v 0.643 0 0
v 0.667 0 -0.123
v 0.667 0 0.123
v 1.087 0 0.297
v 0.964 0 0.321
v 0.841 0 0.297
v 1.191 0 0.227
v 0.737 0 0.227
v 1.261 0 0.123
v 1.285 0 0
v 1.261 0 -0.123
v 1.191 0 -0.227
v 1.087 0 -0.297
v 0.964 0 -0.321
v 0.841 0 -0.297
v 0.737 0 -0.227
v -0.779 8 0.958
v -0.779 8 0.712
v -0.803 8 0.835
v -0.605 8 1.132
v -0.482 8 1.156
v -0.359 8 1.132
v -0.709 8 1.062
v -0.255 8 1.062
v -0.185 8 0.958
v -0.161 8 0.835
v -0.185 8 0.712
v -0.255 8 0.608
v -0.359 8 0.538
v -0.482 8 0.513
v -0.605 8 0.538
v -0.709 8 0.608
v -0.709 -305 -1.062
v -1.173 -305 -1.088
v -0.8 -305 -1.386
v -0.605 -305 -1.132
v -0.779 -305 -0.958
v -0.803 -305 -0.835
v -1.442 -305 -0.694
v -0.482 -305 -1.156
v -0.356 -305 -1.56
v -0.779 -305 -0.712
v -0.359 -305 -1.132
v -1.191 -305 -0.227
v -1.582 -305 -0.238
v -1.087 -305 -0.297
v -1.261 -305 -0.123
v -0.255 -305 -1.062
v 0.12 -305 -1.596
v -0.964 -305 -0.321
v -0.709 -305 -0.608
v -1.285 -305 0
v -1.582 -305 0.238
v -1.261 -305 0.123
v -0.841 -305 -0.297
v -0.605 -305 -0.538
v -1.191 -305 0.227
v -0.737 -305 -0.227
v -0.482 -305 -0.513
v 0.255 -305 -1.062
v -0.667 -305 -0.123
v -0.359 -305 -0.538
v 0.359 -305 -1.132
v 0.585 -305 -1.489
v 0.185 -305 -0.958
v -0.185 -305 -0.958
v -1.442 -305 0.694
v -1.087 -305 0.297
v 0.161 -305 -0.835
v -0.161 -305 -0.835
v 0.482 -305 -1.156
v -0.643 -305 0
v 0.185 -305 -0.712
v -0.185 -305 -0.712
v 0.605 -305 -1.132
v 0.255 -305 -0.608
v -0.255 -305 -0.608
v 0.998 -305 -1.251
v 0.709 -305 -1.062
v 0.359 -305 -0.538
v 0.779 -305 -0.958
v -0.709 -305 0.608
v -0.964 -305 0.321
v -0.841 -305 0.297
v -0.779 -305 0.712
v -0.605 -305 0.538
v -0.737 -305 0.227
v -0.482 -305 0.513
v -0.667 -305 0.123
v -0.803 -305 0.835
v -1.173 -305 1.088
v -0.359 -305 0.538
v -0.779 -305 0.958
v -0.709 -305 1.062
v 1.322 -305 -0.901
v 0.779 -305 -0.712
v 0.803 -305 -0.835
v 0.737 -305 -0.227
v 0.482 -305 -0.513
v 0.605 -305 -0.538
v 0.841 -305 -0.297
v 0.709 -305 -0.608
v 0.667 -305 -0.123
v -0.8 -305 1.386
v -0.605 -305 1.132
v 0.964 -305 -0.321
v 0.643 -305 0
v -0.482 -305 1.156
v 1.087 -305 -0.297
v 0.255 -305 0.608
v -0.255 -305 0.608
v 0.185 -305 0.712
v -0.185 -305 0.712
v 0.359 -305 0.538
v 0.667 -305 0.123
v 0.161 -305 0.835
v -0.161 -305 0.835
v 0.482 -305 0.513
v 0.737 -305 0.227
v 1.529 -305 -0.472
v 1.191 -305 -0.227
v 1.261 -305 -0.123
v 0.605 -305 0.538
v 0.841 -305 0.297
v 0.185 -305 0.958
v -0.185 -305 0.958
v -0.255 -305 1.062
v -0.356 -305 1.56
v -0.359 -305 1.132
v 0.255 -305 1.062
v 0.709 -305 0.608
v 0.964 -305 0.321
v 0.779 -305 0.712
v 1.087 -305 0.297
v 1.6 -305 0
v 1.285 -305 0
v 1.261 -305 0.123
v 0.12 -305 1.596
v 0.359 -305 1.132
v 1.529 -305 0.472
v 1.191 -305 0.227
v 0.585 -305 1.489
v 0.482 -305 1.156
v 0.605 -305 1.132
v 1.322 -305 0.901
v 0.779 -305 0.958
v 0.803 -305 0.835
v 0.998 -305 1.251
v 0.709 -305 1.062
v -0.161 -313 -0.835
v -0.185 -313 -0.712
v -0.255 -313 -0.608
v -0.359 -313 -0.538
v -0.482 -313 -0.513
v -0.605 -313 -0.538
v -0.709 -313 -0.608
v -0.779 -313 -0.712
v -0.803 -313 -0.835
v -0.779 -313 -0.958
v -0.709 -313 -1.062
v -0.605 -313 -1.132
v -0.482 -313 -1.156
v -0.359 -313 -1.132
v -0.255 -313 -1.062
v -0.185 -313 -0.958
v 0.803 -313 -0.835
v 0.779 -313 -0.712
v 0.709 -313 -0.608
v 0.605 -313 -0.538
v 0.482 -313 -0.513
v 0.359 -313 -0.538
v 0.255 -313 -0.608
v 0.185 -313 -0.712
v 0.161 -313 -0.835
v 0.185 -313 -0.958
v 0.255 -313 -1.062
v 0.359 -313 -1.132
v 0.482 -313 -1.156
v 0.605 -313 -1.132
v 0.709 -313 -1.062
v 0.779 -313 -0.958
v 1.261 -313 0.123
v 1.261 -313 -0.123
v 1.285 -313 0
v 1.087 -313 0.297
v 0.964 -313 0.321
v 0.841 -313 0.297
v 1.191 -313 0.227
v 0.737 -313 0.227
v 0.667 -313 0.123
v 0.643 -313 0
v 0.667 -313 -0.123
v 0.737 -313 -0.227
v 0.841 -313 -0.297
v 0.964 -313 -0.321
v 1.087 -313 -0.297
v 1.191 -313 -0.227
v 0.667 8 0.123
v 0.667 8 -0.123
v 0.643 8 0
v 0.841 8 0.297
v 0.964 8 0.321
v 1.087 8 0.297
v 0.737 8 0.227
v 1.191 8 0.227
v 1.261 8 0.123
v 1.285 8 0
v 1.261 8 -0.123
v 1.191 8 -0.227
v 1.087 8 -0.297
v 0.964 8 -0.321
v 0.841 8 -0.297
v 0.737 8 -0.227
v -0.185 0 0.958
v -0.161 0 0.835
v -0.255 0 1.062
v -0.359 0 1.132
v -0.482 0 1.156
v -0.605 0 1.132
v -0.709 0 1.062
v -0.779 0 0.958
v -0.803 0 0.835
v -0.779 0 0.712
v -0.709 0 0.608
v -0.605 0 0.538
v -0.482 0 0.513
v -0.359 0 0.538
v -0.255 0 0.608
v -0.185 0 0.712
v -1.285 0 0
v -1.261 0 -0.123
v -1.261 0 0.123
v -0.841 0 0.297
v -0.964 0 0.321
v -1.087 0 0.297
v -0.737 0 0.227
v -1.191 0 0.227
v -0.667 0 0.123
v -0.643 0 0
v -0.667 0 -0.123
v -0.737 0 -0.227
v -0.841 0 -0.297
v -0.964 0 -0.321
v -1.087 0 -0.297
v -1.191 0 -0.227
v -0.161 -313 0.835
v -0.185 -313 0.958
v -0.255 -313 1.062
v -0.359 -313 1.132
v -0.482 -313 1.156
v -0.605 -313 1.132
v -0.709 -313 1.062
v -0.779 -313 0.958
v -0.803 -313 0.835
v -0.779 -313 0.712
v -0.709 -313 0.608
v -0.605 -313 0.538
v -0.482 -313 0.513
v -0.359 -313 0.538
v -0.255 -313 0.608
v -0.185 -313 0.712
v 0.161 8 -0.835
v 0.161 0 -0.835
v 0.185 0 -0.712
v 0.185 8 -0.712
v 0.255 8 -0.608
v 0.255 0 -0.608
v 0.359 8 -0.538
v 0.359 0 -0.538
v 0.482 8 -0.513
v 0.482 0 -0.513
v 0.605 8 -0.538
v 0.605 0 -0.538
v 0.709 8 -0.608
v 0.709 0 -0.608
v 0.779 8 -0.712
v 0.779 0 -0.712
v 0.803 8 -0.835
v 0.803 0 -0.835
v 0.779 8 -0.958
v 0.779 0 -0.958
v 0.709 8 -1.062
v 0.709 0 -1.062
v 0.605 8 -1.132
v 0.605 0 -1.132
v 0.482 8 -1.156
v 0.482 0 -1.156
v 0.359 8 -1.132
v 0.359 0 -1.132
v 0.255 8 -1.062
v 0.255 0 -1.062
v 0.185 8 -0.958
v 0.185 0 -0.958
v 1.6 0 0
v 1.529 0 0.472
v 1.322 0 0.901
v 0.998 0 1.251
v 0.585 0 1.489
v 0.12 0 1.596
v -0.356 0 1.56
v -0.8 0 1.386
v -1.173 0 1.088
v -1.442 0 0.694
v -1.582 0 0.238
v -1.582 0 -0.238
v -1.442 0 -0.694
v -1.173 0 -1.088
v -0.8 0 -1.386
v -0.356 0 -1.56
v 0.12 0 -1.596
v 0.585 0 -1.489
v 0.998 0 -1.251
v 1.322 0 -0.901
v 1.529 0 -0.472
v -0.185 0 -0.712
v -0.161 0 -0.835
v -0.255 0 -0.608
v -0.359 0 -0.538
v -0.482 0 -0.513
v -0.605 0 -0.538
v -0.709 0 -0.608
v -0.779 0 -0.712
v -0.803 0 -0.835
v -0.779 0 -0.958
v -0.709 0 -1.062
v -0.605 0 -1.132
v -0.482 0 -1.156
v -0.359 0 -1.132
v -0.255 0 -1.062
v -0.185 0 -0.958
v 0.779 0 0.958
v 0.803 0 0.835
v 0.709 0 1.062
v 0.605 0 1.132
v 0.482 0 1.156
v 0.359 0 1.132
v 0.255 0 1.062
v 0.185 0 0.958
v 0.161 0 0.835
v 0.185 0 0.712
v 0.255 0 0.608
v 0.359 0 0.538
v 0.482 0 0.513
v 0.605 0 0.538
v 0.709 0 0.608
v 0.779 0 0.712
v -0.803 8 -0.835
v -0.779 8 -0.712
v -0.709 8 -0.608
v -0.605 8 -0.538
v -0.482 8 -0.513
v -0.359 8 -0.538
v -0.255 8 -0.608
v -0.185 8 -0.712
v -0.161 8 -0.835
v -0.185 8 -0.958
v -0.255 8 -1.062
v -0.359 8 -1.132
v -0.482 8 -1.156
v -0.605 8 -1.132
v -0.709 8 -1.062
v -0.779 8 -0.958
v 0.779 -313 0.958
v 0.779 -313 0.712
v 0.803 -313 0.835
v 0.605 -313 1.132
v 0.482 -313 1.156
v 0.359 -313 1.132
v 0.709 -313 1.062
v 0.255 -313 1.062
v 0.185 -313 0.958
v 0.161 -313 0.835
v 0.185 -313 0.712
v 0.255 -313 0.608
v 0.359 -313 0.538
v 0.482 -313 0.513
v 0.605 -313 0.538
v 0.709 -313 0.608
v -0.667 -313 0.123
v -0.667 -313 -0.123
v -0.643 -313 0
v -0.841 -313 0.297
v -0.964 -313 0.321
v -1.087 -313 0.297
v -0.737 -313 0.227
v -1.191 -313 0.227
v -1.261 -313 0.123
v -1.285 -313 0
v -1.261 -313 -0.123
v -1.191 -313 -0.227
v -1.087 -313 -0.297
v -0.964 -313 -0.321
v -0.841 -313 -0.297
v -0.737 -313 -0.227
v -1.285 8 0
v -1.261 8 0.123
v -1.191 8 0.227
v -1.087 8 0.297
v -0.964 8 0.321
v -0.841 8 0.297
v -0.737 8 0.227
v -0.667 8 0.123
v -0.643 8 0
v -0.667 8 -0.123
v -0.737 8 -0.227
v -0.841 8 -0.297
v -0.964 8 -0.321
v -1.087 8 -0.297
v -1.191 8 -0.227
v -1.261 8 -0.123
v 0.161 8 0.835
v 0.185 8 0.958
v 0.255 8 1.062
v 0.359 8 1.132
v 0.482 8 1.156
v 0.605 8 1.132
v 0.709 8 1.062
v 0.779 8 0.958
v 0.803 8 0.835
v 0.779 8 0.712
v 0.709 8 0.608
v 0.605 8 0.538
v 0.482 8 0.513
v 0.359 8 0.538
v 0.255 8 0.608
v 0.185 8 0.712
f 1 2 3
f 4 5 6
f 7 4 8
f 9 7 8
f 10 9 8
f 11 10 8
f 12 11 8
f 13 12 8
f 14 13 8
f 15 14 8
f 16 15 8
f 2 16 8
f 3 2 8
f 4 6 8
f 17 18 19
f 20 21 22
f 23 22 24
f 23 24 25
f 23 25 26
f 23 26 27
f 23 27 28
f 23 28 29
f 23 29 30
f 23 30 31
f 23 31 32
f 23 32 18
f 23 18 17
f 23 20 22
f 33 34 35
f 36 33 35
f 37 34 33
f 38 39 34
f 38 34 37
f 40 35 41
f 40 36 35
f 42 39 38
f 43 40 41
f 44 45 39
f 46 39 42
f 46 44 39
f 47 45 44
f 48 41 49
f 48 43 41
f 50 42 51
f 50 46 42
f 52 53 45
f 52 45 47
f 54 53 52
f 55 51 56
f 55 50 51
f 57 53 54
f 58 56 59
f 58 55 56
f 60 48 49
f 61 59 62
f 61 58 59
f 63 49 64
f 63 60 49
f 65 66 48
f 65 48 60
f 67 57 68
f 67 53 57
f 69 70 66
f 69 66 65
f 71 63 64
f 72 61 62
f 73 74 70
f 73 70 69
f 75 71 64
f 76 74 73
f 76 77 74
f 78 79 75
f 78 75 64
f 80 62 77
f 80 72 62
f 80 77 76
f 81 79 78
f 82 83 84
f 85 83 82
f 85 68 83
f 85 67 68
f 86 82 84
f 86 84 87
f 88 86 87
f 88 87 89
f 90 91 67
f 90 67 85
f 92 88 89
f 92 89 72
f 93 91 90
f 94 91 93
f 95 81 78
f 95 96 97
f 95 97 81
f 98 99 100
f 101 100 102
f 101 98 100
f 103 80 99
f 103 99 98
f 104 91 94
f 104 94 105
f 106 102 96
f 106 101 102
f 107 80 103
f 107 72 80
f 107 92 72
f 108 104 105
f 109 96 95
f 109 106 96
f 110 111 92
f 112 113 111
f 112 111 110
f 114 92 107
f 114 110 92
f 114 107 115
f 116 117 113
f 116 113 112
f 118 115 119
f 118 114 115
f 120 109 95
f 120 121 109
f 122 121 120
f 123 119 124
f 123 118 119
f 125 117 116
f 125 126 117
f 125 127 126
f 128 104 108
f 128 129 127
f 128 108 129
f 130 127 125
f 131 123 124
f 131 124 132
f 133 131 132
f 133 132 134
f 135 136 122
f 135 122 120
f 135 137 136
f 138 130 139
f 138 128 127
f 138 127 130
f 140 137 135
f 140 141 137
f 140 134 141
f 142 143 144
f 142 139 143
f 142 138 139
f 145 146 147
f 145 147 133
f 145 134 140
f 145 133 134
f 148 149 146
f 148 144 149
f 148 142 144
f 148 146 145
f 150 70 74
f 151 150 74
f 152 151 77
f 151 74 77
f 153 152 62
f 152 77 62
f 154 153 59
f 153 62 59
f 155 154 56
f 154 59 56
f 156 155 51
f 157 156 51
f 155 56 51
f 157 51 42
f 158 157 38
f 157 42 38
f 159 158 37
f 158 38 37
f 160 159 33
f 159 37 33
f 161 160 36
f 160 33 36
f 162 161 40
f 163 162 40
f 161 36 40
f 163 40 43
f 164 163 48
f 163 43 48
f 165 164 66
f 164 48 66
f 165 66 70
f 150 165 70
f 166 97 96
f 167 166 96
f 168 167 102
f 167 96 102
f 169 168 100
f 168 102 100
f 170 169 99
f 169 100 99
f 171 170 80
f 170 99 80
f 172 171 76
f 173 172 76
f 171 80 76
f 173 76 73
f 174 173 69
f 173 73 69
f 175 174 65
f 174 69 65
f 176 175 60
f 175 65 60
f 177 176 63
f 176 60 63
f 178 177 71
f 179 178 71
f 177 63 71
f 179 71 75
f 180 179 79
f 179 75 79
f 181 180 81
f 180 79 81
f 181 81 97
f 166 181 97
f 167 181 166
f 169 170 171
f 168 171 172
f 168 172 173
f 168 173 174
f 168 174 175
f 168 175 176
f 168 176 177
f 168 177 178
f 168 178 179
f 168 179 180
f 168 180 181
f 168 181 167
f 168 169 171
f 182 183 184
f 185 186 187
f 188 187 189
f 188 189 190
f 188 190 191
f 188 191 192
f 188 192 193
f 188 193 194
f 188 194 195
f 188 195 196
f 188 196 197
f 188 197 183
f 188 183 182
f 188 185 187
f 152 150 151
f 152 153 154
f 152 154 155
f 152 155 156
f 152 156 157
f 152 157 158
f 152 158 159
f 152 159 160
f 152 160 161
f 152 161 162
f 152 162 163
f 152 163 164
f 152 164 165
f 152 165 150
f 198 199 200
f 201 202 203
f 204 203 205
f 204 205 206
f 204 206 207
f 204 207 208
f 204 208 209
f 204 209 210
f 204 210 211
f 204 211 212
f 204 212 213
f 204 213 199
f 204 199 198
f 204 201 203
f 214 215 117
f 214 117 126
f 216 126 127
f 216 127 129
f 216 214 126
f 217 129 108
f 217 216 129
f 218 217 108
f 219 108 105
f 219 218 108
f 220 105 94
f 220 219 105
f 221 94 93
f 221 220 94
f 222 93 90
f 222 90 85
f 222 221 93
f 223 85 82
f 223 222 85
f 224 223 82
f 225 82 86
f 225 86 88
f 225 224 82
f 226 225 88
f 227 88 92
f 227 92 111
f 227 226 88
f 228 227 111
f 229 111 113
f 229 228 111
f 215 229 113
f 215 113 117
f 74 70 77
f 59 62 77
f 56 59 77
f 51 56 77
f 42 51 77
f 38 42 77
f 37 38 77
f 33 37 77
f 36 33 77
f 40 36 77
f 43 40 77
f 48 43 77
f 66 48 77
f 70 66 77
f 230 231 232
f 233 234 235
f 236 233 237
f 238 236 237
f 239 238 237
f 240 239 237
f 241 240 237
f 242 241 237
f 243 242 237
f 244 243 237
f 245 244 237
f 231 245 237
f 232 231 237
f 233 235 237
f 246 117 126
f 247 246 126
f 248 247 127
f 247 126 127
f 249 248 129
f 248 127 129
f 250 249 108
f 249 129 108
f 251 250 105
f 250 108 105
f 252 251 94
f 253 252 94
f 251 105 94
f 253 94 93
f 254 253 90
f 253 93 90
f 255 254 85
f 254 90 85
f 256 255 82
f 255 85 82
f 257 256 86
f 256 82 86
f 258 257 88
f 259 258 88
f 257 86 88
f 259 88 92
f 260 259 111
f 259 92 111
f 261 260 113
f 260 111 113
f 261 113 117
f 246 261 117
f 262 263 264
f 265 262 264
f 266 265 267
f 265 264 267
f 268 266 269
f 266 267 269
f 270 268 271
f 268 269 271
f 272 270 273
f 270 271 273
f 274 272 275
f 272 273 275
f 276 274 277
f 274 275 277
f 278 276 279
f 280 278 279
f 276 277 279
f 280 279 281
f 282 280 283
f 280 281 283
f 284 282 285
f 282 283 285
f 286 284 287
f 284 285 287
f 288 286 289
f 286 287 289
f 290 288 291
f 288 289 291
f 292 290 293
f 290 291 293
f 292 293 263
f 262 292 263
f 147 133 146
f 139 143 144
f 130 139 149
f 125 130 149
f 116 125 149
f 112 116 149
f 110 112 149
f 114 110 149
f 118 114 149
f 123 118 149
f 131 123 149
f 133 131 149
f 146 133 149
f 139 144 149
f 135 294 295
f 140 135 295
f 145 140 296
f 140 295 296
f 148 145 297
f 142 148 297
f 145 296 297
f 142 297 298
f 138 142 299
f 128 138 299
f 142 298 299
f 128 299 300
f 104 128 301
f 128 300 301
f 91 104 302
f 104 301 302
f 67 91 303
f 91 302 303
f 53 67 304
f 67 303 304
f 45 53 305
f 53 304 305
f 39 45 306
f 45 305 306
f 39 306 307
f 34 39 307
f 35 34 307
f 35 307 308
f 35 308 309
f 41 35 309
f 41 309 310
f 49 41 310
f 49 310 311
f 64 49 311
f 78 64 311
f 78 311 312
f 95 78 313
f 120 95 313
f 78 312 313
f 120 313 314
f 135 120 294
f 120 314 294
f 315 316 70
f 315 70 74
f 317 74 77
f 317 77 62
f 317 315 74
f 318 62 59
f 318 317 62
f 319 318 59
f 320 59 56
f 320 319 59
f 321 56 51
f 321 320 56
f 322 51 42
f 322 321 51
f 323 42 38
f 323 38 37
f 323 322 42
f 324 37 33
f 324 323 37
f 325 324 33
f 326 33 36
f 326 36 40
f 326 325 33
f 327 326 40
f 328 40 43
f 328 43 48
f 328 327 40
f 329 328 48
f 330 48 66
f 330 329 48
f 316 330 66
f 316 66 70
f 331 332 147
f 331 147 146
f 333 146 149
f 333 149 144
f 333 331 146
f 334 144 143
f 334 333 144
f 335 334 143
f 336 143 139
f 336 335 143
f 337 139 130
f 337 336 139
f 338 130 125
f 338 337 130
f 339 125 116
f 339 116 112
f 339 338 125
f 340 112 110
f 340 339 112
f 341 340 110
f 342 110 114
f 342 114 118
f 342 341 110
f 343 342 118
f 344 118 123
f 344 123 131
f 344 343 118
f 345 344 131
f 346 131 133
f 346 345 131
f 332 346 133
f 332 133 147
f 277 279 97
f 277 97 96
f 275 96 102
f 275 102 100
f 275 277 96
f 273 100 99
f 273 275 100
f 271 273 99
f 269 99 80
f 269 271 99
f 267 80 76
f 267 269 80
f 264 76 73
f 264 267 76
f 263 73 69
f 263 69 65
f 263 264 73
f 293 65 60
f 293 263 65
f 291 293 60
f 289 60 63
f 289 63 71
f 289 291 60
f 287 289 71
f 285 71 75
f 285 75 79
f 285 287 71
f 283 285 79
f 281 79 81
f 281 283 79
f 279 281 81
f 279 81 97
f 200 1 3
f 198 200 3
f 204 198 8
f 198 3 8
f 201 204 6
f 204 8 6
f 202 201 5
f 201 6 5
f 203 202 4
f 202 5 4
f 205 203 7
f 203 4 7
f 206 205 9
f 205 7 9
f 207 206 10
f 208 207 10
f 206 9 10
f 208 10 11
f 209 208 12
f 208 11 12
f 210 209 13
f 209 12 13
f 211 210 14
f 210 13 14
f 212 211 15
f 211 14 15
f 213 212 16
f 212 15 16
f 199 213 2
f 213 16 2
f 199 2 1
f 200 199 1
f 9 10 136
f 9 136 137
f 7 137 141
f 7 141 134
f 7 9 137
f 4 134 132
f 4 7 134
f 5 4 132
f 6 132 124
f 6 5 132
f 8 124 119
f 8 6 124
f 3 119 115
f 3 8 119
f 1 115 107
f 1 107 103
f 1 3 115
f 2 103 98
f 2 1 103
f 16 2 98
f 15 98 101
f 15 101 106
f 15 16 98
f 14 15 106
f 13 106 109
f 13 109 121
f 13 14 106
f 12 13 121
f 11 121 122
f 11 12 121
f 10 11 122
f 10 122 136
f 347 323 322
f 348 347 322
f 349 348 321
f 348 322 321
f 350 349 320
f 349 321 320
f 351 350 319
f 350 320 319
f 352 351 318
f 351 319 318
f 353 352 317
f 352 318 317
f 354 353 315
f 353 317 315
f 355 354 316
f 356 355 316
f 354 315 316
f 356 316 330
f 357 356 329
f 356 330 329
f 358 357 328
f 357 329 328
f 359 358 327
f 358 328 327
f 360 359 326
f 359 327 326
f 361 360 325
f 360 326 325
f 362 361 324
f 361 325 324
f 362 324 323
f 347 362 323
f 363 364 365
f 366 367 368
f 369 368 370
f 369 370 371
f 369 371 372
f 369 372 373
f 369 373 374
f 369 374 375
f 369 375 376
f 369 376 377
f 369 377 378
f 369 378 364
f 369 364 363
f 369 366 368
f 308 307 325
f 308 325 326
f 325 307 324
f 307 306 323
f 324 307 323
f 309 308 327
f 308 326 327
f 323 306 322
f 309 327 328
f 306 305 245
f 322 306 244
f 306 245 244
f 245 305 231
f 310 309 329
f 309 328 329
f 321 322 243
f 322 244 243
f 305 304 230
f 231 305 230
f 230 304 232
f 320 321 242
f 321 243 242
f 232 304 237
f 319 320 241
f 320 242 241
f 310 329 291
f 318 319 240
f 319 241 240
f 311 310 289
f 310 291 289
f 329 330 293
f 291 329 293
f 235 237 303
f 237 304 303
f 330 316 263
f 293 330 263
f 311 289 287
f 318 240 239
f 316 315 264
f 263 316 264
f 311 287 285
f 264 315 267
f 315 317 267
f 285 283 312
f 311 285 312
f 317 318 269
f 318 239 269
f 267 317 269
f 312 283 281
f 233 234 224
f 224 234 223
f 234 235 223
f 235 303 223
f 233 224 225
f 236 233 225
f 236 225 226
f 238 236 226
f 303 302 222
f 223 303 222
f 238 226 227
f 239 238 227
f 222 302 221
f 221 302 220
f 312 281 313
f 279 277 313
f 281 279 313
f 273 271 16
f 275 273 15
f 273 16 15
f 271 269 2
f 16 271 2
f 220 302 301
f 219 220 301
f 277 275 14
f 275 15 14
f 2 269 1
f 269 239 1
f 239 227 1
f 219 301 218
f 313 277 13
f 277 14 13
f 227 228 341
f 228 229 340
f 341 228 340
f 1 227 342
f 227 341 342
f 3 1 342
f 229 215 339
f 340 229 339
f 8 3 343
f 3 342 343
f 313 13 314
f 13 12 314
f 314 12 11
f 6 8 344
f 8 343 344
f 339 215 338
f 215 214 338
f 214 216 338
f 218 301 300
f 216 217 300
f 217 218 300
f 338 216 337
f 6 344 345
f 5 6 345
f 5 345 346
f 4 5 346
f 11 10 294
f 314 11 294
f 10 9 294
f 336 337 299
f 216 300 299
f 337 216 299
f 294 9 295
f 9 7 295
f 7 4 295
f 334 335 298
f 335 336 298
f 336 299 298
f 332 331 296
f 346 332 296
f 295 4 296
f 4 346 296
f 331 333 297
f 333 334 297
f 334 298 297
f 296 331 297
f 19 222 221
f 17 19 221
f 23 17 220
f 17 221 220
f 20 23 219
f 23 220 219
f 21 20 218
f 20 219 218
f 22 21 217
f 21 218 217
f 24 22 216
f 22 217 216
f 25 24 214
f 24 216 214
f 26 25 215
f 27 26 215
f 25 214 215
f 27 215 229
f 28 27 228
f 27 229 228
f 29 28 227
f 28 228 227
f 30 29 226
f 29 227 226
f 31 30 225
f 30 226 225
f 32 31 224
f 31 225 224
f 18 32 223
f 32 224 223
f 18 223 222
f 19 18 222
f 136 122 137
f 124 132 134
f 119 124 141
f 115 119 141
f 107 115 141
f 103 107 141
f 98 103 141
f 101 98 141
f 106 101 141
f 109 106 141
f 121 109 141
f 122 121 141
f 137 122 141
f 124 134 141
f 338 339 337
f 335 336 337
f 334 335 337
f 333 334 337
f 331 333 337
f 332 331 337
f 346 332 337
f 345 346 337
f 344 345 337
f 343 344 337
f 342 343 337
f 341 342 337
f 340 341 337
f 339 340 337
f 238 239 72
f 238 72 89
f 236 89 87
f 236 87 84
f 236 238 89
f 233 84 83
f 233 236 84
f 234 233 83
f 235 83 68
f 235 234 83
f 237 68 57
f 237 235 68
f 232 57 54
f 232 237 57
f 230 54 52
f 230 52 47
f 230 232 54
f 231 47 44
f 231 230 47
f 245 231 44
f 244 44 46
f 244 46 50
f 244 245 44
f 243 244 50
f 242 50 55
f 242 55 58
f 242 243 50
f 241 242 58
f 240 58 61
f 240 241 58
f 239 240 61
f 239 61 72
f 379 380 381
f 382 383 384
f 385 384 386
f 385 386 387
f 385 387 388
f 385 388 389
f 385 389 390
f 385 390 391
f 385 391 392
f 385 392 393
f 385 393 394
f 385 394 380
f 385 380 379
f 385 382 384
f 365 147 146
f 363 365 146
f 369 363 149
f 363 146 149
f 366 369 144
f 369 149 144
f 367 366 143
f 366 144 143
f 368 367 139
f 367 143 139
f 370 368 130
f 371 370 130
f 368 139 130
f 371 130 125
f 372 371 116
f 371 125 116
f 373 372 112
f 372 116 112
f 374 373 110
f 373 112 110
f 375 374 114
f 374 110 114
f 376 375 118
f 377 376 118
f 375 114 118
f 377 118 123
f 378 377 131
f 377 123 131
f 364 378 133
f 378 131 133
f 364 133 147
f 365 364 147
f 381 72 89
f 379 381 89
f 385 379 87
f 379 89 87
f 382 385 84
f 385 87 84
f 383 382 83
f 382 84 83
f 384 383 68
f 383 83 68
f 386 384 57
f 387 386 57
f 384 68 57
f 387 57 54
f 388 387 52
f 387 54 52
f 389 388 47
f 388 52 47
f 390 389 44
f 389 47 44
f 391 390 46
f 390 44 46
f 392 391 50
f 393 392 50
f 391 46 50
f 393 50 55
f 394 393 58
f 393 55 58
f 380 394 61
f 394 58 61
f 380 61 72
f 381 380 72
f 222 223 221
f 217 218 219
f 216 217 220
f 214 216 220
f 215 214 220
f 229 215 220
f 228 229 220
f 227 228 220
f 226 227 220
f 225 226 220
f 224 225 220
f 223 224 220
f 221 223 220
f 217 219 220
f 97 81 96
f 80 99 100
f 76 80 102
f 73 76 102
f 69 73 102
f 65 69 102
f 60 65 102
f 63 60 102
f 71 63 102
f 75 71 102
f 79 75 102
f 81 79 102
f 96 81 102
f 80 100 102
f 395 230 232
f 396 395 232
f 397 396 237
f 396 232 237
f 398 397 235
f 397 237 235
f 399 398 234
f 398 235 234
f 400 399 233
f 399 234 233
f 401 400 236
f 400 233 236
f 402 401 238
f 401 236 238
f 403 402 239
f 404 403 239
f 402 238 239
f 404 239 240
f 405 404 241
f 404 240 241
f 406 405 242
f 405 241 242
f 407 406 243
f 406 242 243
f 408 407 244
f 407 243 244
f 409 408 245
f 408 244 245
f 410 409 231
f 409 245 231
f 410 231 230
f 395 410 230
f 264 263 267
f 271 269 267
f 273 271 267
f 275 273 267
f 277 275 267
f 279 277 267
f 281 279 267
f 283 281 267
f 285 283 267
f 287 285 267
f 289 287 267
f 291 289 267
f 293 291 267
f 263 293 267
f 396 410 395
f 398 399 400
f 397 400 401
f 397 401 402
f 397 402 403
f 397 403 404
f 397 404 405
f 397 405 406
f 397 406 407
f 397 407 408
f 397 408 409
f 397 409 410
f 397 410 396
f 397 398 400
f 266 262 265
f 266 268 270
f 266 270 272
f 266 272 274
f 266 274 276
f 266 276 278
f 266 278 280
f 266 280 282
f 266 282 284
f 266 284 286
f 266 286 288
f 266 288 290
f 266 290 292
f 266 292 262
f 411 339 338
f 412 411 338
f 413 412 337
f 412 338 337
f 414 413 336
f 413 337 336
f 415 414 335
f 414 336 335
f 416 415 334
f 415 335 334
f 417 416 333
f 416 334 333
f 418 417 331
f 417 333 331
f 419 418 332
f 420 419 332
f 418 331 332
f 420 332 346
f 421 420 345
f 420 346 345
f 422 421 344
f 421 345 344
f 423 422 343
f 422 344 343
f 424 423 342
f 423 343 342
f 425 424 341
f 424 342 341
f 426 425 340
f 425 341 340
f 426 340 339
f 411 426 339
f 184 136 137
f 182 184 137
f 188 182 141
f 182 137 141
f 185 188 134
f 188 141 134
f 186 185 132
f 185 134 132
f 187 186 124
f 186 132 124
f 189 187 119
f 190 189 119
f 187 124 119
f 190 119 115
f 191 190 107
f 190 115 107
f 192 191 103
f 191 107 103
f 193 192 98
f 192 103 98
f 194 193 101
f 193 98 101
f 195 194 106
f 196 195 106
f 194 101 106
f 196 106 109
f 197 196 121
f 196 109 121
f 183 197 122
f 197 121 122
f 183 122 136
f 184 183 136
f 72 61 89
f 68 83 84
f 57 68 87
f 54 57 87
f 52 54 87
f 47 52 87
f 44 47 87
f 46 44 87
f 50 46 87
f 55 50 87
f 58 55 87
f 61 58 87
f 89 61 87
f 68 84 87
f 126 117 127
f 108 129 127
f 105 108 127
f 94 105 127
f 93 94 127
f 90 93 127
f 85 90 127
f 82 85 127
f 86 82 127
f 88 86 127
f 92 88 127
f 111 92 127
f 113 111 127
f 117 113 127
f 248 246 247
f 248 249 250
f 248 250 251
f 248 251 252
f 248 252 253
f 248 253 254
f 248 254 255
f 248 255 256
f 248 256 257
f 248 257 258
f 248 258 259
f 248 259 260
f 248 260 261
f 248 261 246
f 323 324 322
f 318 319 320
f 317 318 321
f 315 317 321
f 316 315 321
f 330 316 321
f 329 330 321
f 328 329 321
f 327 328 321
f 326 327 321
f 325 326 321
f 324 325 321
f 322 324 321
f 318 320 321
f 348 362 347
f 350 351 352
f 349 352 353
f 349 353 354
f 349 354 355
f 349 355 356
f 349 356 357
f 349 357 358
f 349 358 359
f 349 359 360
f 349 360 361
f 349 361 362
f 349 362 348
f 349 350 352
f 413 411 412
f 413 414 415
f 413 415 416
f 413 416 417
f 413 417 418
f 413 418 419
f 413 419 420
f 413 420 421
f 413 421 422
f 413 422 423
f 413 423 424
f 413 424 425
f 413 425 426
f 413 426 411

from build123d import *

# Parameters (mm, degrees)
F0_R     = 1.6
F0_R_2   = 0.32131
F1_DEPTH = 305
F2_R     = 0.32131
F3_DEPTH = 8
F4_R     = 0.32131
F5_DEPTH = 8


with BuildPart() as f1:
    # F0 (on Front) → F1 (new body)
    with BuildSketch(Plane.XZ):
        Circle(F0_R)
        with Locations((-0.481965, -0.8347878675)):
            Circle(F0_R_2, mode=Mode.SUBTRACT)
        with Locations((0.481965, -0.8347878675)):
            Circle(F0_R_2, mode=Mode.SUBTRACT)
        with Locations((-0.96393, 0)):
            Circle(F0_R_2, mode=Mode.SUBTRACT)
        with Locations((-0.481965, 0.8347878675)):
            Circle(F0_R_2, mode=Mode.SUBTRACT)
        with Locations((0.96393, 0)):
            Circle(F0_R_2, mode=Mode.SUBTRACT)
        with Locations((0.481965, 0.8347878675)):
            Circle(F0_R_2, mode=Mode.SUBTRACT)
    extrude(amount=F1_DEPTH)


with BuildPart() as f3:
    # F2 (on face) → F3 (new body)
    with BuildSketch(Plane.XZ.offset(305)):
        with Locations((-0.481965, 0.8347878675)):
            Circle(F2_R)
    extrude(amount=F3_DEPTH)


with BuildPart() as f3b:
    # F2 (on face) → F3, piece 2 (new body)
    with BuildSketch(Plane.XZ.offset(305)):
        with Locations((0.481965, 0.8347878675)):
            Circle(F2_R)
    extrude(amount=F3_DEPTH)


with BuildPart() as f3c:
    # F2 (on face) → F3, piece 3 (new body)
    with BuildSketch(Plane.XZ.offset(305)):
        with Locations((-0.96393, 0)):
            Circle(F2_R)
    extrude(amount=F3_DEPTH)


with BuildPart() as f3d:
    # F2 (on face) → F3, piece 4 (new body)
    with BuildSketch(Plane.XZ.offset(305)):
        with Locations((-0.481965, -0.8347878675)):
            Circle(F2_R)
    extrude(amount=F3_DEPTH)


with BuildPart() as f3e:
    # F2 (on face) → F3, piece 5 (new body)
    with BuildSketch(Plane.XZ.offset(305)):
        with Locations((0.481965, -0.8347878675)):
            Circle(F2_R)
    extrude(amount=F3_DEPTH)


with BuildPart() as f3f:
    # F2 (on face) → F3, piece 6 (new body)
    with BuildSketch(Plane.XZ.offset(305)):
        with Locations((0.96393, 0)):
            Circle(F2_R)
    extrude(amount=F3_DEPTH)


with BuildPart() as f5:
    # F4 (on face) → F5 (new body)
    with BuildSketch(Plane(origin=(0, 0, 0), x_dir=(-1, 0, 0), z_dir=(0, 1, 0))):
        with Locations((0.481965, -0.8347878675)):
            Circle(F4_R)
    extrude(amount=F5_DEPTH)


with BuildPart() as f5b:
    # F4 (on face) → F5, piece 2 (new body)
    with BuildSketch(Plane(origin=(0, 0, 0), x_dir=(-1, 0, 0), z_dir=(0, 1, 0))):
        with Locations((-0.481965, -0.8347878675)):
            Circle(F4_R)
    extrude(amount=F5_DEPTH)


with BuildPart() as f5c:
    # F4 (on face) → F5, piece 3 (new body)
    with BuildSketch(Plane(origin=(0, 0, 0), x_dir=(-1, 0, 0), z_dir=(0, 1, 0))):
        with Locations((0.96393, 0)):
            Circle(F4_R)
    extrude(amount=F5_DEPTH)


with BuildPart() as f5d:
    # F4 (on face) → F5, piece 4 (new body)
    with BuildSketch(Plane(origin=(0, 0, 0), x_dir=(-1, 0, 0), z_dir=(0, 1, 0))):
        with Locations((0.481965, 0.8347878675)):
            Circle(F4_R)
    extrude(amount=F5_DEPTH)


with BuildPart() as f5e:
    # F4 (on face) → F5, piece 5 (new body)
    with BuildSketch(Plane(origin=(0, 0, 0), x_dir=(-1, 0, 0), z_dir=(0, 1, 0))):
        with Locations((-0.96393, 0)):
            Circle(F4_R)
    extrude(amount=F5_DEPTH)


with BuildPart() as f5f:
    # F4 (on face) → F5, piece 6 (new body)
    with BuildSketch(Plane(origin=(0, 0, 0), x_dir=(-1, 0, 0), z_dir=(0, 1, 0))):
        with Locations((-0.481965, 0.8347878675)):
            Circle(F4_R)
    extrude(amount=F5_DEPTH)


solid = Compound([f1.part, f3.part, f3b.part, f3c.part, f3d.part, f3e.part, f3f.part, f5.part, f5b.part, f5c.part, f5d.part, f5e.part, f5f.part])
